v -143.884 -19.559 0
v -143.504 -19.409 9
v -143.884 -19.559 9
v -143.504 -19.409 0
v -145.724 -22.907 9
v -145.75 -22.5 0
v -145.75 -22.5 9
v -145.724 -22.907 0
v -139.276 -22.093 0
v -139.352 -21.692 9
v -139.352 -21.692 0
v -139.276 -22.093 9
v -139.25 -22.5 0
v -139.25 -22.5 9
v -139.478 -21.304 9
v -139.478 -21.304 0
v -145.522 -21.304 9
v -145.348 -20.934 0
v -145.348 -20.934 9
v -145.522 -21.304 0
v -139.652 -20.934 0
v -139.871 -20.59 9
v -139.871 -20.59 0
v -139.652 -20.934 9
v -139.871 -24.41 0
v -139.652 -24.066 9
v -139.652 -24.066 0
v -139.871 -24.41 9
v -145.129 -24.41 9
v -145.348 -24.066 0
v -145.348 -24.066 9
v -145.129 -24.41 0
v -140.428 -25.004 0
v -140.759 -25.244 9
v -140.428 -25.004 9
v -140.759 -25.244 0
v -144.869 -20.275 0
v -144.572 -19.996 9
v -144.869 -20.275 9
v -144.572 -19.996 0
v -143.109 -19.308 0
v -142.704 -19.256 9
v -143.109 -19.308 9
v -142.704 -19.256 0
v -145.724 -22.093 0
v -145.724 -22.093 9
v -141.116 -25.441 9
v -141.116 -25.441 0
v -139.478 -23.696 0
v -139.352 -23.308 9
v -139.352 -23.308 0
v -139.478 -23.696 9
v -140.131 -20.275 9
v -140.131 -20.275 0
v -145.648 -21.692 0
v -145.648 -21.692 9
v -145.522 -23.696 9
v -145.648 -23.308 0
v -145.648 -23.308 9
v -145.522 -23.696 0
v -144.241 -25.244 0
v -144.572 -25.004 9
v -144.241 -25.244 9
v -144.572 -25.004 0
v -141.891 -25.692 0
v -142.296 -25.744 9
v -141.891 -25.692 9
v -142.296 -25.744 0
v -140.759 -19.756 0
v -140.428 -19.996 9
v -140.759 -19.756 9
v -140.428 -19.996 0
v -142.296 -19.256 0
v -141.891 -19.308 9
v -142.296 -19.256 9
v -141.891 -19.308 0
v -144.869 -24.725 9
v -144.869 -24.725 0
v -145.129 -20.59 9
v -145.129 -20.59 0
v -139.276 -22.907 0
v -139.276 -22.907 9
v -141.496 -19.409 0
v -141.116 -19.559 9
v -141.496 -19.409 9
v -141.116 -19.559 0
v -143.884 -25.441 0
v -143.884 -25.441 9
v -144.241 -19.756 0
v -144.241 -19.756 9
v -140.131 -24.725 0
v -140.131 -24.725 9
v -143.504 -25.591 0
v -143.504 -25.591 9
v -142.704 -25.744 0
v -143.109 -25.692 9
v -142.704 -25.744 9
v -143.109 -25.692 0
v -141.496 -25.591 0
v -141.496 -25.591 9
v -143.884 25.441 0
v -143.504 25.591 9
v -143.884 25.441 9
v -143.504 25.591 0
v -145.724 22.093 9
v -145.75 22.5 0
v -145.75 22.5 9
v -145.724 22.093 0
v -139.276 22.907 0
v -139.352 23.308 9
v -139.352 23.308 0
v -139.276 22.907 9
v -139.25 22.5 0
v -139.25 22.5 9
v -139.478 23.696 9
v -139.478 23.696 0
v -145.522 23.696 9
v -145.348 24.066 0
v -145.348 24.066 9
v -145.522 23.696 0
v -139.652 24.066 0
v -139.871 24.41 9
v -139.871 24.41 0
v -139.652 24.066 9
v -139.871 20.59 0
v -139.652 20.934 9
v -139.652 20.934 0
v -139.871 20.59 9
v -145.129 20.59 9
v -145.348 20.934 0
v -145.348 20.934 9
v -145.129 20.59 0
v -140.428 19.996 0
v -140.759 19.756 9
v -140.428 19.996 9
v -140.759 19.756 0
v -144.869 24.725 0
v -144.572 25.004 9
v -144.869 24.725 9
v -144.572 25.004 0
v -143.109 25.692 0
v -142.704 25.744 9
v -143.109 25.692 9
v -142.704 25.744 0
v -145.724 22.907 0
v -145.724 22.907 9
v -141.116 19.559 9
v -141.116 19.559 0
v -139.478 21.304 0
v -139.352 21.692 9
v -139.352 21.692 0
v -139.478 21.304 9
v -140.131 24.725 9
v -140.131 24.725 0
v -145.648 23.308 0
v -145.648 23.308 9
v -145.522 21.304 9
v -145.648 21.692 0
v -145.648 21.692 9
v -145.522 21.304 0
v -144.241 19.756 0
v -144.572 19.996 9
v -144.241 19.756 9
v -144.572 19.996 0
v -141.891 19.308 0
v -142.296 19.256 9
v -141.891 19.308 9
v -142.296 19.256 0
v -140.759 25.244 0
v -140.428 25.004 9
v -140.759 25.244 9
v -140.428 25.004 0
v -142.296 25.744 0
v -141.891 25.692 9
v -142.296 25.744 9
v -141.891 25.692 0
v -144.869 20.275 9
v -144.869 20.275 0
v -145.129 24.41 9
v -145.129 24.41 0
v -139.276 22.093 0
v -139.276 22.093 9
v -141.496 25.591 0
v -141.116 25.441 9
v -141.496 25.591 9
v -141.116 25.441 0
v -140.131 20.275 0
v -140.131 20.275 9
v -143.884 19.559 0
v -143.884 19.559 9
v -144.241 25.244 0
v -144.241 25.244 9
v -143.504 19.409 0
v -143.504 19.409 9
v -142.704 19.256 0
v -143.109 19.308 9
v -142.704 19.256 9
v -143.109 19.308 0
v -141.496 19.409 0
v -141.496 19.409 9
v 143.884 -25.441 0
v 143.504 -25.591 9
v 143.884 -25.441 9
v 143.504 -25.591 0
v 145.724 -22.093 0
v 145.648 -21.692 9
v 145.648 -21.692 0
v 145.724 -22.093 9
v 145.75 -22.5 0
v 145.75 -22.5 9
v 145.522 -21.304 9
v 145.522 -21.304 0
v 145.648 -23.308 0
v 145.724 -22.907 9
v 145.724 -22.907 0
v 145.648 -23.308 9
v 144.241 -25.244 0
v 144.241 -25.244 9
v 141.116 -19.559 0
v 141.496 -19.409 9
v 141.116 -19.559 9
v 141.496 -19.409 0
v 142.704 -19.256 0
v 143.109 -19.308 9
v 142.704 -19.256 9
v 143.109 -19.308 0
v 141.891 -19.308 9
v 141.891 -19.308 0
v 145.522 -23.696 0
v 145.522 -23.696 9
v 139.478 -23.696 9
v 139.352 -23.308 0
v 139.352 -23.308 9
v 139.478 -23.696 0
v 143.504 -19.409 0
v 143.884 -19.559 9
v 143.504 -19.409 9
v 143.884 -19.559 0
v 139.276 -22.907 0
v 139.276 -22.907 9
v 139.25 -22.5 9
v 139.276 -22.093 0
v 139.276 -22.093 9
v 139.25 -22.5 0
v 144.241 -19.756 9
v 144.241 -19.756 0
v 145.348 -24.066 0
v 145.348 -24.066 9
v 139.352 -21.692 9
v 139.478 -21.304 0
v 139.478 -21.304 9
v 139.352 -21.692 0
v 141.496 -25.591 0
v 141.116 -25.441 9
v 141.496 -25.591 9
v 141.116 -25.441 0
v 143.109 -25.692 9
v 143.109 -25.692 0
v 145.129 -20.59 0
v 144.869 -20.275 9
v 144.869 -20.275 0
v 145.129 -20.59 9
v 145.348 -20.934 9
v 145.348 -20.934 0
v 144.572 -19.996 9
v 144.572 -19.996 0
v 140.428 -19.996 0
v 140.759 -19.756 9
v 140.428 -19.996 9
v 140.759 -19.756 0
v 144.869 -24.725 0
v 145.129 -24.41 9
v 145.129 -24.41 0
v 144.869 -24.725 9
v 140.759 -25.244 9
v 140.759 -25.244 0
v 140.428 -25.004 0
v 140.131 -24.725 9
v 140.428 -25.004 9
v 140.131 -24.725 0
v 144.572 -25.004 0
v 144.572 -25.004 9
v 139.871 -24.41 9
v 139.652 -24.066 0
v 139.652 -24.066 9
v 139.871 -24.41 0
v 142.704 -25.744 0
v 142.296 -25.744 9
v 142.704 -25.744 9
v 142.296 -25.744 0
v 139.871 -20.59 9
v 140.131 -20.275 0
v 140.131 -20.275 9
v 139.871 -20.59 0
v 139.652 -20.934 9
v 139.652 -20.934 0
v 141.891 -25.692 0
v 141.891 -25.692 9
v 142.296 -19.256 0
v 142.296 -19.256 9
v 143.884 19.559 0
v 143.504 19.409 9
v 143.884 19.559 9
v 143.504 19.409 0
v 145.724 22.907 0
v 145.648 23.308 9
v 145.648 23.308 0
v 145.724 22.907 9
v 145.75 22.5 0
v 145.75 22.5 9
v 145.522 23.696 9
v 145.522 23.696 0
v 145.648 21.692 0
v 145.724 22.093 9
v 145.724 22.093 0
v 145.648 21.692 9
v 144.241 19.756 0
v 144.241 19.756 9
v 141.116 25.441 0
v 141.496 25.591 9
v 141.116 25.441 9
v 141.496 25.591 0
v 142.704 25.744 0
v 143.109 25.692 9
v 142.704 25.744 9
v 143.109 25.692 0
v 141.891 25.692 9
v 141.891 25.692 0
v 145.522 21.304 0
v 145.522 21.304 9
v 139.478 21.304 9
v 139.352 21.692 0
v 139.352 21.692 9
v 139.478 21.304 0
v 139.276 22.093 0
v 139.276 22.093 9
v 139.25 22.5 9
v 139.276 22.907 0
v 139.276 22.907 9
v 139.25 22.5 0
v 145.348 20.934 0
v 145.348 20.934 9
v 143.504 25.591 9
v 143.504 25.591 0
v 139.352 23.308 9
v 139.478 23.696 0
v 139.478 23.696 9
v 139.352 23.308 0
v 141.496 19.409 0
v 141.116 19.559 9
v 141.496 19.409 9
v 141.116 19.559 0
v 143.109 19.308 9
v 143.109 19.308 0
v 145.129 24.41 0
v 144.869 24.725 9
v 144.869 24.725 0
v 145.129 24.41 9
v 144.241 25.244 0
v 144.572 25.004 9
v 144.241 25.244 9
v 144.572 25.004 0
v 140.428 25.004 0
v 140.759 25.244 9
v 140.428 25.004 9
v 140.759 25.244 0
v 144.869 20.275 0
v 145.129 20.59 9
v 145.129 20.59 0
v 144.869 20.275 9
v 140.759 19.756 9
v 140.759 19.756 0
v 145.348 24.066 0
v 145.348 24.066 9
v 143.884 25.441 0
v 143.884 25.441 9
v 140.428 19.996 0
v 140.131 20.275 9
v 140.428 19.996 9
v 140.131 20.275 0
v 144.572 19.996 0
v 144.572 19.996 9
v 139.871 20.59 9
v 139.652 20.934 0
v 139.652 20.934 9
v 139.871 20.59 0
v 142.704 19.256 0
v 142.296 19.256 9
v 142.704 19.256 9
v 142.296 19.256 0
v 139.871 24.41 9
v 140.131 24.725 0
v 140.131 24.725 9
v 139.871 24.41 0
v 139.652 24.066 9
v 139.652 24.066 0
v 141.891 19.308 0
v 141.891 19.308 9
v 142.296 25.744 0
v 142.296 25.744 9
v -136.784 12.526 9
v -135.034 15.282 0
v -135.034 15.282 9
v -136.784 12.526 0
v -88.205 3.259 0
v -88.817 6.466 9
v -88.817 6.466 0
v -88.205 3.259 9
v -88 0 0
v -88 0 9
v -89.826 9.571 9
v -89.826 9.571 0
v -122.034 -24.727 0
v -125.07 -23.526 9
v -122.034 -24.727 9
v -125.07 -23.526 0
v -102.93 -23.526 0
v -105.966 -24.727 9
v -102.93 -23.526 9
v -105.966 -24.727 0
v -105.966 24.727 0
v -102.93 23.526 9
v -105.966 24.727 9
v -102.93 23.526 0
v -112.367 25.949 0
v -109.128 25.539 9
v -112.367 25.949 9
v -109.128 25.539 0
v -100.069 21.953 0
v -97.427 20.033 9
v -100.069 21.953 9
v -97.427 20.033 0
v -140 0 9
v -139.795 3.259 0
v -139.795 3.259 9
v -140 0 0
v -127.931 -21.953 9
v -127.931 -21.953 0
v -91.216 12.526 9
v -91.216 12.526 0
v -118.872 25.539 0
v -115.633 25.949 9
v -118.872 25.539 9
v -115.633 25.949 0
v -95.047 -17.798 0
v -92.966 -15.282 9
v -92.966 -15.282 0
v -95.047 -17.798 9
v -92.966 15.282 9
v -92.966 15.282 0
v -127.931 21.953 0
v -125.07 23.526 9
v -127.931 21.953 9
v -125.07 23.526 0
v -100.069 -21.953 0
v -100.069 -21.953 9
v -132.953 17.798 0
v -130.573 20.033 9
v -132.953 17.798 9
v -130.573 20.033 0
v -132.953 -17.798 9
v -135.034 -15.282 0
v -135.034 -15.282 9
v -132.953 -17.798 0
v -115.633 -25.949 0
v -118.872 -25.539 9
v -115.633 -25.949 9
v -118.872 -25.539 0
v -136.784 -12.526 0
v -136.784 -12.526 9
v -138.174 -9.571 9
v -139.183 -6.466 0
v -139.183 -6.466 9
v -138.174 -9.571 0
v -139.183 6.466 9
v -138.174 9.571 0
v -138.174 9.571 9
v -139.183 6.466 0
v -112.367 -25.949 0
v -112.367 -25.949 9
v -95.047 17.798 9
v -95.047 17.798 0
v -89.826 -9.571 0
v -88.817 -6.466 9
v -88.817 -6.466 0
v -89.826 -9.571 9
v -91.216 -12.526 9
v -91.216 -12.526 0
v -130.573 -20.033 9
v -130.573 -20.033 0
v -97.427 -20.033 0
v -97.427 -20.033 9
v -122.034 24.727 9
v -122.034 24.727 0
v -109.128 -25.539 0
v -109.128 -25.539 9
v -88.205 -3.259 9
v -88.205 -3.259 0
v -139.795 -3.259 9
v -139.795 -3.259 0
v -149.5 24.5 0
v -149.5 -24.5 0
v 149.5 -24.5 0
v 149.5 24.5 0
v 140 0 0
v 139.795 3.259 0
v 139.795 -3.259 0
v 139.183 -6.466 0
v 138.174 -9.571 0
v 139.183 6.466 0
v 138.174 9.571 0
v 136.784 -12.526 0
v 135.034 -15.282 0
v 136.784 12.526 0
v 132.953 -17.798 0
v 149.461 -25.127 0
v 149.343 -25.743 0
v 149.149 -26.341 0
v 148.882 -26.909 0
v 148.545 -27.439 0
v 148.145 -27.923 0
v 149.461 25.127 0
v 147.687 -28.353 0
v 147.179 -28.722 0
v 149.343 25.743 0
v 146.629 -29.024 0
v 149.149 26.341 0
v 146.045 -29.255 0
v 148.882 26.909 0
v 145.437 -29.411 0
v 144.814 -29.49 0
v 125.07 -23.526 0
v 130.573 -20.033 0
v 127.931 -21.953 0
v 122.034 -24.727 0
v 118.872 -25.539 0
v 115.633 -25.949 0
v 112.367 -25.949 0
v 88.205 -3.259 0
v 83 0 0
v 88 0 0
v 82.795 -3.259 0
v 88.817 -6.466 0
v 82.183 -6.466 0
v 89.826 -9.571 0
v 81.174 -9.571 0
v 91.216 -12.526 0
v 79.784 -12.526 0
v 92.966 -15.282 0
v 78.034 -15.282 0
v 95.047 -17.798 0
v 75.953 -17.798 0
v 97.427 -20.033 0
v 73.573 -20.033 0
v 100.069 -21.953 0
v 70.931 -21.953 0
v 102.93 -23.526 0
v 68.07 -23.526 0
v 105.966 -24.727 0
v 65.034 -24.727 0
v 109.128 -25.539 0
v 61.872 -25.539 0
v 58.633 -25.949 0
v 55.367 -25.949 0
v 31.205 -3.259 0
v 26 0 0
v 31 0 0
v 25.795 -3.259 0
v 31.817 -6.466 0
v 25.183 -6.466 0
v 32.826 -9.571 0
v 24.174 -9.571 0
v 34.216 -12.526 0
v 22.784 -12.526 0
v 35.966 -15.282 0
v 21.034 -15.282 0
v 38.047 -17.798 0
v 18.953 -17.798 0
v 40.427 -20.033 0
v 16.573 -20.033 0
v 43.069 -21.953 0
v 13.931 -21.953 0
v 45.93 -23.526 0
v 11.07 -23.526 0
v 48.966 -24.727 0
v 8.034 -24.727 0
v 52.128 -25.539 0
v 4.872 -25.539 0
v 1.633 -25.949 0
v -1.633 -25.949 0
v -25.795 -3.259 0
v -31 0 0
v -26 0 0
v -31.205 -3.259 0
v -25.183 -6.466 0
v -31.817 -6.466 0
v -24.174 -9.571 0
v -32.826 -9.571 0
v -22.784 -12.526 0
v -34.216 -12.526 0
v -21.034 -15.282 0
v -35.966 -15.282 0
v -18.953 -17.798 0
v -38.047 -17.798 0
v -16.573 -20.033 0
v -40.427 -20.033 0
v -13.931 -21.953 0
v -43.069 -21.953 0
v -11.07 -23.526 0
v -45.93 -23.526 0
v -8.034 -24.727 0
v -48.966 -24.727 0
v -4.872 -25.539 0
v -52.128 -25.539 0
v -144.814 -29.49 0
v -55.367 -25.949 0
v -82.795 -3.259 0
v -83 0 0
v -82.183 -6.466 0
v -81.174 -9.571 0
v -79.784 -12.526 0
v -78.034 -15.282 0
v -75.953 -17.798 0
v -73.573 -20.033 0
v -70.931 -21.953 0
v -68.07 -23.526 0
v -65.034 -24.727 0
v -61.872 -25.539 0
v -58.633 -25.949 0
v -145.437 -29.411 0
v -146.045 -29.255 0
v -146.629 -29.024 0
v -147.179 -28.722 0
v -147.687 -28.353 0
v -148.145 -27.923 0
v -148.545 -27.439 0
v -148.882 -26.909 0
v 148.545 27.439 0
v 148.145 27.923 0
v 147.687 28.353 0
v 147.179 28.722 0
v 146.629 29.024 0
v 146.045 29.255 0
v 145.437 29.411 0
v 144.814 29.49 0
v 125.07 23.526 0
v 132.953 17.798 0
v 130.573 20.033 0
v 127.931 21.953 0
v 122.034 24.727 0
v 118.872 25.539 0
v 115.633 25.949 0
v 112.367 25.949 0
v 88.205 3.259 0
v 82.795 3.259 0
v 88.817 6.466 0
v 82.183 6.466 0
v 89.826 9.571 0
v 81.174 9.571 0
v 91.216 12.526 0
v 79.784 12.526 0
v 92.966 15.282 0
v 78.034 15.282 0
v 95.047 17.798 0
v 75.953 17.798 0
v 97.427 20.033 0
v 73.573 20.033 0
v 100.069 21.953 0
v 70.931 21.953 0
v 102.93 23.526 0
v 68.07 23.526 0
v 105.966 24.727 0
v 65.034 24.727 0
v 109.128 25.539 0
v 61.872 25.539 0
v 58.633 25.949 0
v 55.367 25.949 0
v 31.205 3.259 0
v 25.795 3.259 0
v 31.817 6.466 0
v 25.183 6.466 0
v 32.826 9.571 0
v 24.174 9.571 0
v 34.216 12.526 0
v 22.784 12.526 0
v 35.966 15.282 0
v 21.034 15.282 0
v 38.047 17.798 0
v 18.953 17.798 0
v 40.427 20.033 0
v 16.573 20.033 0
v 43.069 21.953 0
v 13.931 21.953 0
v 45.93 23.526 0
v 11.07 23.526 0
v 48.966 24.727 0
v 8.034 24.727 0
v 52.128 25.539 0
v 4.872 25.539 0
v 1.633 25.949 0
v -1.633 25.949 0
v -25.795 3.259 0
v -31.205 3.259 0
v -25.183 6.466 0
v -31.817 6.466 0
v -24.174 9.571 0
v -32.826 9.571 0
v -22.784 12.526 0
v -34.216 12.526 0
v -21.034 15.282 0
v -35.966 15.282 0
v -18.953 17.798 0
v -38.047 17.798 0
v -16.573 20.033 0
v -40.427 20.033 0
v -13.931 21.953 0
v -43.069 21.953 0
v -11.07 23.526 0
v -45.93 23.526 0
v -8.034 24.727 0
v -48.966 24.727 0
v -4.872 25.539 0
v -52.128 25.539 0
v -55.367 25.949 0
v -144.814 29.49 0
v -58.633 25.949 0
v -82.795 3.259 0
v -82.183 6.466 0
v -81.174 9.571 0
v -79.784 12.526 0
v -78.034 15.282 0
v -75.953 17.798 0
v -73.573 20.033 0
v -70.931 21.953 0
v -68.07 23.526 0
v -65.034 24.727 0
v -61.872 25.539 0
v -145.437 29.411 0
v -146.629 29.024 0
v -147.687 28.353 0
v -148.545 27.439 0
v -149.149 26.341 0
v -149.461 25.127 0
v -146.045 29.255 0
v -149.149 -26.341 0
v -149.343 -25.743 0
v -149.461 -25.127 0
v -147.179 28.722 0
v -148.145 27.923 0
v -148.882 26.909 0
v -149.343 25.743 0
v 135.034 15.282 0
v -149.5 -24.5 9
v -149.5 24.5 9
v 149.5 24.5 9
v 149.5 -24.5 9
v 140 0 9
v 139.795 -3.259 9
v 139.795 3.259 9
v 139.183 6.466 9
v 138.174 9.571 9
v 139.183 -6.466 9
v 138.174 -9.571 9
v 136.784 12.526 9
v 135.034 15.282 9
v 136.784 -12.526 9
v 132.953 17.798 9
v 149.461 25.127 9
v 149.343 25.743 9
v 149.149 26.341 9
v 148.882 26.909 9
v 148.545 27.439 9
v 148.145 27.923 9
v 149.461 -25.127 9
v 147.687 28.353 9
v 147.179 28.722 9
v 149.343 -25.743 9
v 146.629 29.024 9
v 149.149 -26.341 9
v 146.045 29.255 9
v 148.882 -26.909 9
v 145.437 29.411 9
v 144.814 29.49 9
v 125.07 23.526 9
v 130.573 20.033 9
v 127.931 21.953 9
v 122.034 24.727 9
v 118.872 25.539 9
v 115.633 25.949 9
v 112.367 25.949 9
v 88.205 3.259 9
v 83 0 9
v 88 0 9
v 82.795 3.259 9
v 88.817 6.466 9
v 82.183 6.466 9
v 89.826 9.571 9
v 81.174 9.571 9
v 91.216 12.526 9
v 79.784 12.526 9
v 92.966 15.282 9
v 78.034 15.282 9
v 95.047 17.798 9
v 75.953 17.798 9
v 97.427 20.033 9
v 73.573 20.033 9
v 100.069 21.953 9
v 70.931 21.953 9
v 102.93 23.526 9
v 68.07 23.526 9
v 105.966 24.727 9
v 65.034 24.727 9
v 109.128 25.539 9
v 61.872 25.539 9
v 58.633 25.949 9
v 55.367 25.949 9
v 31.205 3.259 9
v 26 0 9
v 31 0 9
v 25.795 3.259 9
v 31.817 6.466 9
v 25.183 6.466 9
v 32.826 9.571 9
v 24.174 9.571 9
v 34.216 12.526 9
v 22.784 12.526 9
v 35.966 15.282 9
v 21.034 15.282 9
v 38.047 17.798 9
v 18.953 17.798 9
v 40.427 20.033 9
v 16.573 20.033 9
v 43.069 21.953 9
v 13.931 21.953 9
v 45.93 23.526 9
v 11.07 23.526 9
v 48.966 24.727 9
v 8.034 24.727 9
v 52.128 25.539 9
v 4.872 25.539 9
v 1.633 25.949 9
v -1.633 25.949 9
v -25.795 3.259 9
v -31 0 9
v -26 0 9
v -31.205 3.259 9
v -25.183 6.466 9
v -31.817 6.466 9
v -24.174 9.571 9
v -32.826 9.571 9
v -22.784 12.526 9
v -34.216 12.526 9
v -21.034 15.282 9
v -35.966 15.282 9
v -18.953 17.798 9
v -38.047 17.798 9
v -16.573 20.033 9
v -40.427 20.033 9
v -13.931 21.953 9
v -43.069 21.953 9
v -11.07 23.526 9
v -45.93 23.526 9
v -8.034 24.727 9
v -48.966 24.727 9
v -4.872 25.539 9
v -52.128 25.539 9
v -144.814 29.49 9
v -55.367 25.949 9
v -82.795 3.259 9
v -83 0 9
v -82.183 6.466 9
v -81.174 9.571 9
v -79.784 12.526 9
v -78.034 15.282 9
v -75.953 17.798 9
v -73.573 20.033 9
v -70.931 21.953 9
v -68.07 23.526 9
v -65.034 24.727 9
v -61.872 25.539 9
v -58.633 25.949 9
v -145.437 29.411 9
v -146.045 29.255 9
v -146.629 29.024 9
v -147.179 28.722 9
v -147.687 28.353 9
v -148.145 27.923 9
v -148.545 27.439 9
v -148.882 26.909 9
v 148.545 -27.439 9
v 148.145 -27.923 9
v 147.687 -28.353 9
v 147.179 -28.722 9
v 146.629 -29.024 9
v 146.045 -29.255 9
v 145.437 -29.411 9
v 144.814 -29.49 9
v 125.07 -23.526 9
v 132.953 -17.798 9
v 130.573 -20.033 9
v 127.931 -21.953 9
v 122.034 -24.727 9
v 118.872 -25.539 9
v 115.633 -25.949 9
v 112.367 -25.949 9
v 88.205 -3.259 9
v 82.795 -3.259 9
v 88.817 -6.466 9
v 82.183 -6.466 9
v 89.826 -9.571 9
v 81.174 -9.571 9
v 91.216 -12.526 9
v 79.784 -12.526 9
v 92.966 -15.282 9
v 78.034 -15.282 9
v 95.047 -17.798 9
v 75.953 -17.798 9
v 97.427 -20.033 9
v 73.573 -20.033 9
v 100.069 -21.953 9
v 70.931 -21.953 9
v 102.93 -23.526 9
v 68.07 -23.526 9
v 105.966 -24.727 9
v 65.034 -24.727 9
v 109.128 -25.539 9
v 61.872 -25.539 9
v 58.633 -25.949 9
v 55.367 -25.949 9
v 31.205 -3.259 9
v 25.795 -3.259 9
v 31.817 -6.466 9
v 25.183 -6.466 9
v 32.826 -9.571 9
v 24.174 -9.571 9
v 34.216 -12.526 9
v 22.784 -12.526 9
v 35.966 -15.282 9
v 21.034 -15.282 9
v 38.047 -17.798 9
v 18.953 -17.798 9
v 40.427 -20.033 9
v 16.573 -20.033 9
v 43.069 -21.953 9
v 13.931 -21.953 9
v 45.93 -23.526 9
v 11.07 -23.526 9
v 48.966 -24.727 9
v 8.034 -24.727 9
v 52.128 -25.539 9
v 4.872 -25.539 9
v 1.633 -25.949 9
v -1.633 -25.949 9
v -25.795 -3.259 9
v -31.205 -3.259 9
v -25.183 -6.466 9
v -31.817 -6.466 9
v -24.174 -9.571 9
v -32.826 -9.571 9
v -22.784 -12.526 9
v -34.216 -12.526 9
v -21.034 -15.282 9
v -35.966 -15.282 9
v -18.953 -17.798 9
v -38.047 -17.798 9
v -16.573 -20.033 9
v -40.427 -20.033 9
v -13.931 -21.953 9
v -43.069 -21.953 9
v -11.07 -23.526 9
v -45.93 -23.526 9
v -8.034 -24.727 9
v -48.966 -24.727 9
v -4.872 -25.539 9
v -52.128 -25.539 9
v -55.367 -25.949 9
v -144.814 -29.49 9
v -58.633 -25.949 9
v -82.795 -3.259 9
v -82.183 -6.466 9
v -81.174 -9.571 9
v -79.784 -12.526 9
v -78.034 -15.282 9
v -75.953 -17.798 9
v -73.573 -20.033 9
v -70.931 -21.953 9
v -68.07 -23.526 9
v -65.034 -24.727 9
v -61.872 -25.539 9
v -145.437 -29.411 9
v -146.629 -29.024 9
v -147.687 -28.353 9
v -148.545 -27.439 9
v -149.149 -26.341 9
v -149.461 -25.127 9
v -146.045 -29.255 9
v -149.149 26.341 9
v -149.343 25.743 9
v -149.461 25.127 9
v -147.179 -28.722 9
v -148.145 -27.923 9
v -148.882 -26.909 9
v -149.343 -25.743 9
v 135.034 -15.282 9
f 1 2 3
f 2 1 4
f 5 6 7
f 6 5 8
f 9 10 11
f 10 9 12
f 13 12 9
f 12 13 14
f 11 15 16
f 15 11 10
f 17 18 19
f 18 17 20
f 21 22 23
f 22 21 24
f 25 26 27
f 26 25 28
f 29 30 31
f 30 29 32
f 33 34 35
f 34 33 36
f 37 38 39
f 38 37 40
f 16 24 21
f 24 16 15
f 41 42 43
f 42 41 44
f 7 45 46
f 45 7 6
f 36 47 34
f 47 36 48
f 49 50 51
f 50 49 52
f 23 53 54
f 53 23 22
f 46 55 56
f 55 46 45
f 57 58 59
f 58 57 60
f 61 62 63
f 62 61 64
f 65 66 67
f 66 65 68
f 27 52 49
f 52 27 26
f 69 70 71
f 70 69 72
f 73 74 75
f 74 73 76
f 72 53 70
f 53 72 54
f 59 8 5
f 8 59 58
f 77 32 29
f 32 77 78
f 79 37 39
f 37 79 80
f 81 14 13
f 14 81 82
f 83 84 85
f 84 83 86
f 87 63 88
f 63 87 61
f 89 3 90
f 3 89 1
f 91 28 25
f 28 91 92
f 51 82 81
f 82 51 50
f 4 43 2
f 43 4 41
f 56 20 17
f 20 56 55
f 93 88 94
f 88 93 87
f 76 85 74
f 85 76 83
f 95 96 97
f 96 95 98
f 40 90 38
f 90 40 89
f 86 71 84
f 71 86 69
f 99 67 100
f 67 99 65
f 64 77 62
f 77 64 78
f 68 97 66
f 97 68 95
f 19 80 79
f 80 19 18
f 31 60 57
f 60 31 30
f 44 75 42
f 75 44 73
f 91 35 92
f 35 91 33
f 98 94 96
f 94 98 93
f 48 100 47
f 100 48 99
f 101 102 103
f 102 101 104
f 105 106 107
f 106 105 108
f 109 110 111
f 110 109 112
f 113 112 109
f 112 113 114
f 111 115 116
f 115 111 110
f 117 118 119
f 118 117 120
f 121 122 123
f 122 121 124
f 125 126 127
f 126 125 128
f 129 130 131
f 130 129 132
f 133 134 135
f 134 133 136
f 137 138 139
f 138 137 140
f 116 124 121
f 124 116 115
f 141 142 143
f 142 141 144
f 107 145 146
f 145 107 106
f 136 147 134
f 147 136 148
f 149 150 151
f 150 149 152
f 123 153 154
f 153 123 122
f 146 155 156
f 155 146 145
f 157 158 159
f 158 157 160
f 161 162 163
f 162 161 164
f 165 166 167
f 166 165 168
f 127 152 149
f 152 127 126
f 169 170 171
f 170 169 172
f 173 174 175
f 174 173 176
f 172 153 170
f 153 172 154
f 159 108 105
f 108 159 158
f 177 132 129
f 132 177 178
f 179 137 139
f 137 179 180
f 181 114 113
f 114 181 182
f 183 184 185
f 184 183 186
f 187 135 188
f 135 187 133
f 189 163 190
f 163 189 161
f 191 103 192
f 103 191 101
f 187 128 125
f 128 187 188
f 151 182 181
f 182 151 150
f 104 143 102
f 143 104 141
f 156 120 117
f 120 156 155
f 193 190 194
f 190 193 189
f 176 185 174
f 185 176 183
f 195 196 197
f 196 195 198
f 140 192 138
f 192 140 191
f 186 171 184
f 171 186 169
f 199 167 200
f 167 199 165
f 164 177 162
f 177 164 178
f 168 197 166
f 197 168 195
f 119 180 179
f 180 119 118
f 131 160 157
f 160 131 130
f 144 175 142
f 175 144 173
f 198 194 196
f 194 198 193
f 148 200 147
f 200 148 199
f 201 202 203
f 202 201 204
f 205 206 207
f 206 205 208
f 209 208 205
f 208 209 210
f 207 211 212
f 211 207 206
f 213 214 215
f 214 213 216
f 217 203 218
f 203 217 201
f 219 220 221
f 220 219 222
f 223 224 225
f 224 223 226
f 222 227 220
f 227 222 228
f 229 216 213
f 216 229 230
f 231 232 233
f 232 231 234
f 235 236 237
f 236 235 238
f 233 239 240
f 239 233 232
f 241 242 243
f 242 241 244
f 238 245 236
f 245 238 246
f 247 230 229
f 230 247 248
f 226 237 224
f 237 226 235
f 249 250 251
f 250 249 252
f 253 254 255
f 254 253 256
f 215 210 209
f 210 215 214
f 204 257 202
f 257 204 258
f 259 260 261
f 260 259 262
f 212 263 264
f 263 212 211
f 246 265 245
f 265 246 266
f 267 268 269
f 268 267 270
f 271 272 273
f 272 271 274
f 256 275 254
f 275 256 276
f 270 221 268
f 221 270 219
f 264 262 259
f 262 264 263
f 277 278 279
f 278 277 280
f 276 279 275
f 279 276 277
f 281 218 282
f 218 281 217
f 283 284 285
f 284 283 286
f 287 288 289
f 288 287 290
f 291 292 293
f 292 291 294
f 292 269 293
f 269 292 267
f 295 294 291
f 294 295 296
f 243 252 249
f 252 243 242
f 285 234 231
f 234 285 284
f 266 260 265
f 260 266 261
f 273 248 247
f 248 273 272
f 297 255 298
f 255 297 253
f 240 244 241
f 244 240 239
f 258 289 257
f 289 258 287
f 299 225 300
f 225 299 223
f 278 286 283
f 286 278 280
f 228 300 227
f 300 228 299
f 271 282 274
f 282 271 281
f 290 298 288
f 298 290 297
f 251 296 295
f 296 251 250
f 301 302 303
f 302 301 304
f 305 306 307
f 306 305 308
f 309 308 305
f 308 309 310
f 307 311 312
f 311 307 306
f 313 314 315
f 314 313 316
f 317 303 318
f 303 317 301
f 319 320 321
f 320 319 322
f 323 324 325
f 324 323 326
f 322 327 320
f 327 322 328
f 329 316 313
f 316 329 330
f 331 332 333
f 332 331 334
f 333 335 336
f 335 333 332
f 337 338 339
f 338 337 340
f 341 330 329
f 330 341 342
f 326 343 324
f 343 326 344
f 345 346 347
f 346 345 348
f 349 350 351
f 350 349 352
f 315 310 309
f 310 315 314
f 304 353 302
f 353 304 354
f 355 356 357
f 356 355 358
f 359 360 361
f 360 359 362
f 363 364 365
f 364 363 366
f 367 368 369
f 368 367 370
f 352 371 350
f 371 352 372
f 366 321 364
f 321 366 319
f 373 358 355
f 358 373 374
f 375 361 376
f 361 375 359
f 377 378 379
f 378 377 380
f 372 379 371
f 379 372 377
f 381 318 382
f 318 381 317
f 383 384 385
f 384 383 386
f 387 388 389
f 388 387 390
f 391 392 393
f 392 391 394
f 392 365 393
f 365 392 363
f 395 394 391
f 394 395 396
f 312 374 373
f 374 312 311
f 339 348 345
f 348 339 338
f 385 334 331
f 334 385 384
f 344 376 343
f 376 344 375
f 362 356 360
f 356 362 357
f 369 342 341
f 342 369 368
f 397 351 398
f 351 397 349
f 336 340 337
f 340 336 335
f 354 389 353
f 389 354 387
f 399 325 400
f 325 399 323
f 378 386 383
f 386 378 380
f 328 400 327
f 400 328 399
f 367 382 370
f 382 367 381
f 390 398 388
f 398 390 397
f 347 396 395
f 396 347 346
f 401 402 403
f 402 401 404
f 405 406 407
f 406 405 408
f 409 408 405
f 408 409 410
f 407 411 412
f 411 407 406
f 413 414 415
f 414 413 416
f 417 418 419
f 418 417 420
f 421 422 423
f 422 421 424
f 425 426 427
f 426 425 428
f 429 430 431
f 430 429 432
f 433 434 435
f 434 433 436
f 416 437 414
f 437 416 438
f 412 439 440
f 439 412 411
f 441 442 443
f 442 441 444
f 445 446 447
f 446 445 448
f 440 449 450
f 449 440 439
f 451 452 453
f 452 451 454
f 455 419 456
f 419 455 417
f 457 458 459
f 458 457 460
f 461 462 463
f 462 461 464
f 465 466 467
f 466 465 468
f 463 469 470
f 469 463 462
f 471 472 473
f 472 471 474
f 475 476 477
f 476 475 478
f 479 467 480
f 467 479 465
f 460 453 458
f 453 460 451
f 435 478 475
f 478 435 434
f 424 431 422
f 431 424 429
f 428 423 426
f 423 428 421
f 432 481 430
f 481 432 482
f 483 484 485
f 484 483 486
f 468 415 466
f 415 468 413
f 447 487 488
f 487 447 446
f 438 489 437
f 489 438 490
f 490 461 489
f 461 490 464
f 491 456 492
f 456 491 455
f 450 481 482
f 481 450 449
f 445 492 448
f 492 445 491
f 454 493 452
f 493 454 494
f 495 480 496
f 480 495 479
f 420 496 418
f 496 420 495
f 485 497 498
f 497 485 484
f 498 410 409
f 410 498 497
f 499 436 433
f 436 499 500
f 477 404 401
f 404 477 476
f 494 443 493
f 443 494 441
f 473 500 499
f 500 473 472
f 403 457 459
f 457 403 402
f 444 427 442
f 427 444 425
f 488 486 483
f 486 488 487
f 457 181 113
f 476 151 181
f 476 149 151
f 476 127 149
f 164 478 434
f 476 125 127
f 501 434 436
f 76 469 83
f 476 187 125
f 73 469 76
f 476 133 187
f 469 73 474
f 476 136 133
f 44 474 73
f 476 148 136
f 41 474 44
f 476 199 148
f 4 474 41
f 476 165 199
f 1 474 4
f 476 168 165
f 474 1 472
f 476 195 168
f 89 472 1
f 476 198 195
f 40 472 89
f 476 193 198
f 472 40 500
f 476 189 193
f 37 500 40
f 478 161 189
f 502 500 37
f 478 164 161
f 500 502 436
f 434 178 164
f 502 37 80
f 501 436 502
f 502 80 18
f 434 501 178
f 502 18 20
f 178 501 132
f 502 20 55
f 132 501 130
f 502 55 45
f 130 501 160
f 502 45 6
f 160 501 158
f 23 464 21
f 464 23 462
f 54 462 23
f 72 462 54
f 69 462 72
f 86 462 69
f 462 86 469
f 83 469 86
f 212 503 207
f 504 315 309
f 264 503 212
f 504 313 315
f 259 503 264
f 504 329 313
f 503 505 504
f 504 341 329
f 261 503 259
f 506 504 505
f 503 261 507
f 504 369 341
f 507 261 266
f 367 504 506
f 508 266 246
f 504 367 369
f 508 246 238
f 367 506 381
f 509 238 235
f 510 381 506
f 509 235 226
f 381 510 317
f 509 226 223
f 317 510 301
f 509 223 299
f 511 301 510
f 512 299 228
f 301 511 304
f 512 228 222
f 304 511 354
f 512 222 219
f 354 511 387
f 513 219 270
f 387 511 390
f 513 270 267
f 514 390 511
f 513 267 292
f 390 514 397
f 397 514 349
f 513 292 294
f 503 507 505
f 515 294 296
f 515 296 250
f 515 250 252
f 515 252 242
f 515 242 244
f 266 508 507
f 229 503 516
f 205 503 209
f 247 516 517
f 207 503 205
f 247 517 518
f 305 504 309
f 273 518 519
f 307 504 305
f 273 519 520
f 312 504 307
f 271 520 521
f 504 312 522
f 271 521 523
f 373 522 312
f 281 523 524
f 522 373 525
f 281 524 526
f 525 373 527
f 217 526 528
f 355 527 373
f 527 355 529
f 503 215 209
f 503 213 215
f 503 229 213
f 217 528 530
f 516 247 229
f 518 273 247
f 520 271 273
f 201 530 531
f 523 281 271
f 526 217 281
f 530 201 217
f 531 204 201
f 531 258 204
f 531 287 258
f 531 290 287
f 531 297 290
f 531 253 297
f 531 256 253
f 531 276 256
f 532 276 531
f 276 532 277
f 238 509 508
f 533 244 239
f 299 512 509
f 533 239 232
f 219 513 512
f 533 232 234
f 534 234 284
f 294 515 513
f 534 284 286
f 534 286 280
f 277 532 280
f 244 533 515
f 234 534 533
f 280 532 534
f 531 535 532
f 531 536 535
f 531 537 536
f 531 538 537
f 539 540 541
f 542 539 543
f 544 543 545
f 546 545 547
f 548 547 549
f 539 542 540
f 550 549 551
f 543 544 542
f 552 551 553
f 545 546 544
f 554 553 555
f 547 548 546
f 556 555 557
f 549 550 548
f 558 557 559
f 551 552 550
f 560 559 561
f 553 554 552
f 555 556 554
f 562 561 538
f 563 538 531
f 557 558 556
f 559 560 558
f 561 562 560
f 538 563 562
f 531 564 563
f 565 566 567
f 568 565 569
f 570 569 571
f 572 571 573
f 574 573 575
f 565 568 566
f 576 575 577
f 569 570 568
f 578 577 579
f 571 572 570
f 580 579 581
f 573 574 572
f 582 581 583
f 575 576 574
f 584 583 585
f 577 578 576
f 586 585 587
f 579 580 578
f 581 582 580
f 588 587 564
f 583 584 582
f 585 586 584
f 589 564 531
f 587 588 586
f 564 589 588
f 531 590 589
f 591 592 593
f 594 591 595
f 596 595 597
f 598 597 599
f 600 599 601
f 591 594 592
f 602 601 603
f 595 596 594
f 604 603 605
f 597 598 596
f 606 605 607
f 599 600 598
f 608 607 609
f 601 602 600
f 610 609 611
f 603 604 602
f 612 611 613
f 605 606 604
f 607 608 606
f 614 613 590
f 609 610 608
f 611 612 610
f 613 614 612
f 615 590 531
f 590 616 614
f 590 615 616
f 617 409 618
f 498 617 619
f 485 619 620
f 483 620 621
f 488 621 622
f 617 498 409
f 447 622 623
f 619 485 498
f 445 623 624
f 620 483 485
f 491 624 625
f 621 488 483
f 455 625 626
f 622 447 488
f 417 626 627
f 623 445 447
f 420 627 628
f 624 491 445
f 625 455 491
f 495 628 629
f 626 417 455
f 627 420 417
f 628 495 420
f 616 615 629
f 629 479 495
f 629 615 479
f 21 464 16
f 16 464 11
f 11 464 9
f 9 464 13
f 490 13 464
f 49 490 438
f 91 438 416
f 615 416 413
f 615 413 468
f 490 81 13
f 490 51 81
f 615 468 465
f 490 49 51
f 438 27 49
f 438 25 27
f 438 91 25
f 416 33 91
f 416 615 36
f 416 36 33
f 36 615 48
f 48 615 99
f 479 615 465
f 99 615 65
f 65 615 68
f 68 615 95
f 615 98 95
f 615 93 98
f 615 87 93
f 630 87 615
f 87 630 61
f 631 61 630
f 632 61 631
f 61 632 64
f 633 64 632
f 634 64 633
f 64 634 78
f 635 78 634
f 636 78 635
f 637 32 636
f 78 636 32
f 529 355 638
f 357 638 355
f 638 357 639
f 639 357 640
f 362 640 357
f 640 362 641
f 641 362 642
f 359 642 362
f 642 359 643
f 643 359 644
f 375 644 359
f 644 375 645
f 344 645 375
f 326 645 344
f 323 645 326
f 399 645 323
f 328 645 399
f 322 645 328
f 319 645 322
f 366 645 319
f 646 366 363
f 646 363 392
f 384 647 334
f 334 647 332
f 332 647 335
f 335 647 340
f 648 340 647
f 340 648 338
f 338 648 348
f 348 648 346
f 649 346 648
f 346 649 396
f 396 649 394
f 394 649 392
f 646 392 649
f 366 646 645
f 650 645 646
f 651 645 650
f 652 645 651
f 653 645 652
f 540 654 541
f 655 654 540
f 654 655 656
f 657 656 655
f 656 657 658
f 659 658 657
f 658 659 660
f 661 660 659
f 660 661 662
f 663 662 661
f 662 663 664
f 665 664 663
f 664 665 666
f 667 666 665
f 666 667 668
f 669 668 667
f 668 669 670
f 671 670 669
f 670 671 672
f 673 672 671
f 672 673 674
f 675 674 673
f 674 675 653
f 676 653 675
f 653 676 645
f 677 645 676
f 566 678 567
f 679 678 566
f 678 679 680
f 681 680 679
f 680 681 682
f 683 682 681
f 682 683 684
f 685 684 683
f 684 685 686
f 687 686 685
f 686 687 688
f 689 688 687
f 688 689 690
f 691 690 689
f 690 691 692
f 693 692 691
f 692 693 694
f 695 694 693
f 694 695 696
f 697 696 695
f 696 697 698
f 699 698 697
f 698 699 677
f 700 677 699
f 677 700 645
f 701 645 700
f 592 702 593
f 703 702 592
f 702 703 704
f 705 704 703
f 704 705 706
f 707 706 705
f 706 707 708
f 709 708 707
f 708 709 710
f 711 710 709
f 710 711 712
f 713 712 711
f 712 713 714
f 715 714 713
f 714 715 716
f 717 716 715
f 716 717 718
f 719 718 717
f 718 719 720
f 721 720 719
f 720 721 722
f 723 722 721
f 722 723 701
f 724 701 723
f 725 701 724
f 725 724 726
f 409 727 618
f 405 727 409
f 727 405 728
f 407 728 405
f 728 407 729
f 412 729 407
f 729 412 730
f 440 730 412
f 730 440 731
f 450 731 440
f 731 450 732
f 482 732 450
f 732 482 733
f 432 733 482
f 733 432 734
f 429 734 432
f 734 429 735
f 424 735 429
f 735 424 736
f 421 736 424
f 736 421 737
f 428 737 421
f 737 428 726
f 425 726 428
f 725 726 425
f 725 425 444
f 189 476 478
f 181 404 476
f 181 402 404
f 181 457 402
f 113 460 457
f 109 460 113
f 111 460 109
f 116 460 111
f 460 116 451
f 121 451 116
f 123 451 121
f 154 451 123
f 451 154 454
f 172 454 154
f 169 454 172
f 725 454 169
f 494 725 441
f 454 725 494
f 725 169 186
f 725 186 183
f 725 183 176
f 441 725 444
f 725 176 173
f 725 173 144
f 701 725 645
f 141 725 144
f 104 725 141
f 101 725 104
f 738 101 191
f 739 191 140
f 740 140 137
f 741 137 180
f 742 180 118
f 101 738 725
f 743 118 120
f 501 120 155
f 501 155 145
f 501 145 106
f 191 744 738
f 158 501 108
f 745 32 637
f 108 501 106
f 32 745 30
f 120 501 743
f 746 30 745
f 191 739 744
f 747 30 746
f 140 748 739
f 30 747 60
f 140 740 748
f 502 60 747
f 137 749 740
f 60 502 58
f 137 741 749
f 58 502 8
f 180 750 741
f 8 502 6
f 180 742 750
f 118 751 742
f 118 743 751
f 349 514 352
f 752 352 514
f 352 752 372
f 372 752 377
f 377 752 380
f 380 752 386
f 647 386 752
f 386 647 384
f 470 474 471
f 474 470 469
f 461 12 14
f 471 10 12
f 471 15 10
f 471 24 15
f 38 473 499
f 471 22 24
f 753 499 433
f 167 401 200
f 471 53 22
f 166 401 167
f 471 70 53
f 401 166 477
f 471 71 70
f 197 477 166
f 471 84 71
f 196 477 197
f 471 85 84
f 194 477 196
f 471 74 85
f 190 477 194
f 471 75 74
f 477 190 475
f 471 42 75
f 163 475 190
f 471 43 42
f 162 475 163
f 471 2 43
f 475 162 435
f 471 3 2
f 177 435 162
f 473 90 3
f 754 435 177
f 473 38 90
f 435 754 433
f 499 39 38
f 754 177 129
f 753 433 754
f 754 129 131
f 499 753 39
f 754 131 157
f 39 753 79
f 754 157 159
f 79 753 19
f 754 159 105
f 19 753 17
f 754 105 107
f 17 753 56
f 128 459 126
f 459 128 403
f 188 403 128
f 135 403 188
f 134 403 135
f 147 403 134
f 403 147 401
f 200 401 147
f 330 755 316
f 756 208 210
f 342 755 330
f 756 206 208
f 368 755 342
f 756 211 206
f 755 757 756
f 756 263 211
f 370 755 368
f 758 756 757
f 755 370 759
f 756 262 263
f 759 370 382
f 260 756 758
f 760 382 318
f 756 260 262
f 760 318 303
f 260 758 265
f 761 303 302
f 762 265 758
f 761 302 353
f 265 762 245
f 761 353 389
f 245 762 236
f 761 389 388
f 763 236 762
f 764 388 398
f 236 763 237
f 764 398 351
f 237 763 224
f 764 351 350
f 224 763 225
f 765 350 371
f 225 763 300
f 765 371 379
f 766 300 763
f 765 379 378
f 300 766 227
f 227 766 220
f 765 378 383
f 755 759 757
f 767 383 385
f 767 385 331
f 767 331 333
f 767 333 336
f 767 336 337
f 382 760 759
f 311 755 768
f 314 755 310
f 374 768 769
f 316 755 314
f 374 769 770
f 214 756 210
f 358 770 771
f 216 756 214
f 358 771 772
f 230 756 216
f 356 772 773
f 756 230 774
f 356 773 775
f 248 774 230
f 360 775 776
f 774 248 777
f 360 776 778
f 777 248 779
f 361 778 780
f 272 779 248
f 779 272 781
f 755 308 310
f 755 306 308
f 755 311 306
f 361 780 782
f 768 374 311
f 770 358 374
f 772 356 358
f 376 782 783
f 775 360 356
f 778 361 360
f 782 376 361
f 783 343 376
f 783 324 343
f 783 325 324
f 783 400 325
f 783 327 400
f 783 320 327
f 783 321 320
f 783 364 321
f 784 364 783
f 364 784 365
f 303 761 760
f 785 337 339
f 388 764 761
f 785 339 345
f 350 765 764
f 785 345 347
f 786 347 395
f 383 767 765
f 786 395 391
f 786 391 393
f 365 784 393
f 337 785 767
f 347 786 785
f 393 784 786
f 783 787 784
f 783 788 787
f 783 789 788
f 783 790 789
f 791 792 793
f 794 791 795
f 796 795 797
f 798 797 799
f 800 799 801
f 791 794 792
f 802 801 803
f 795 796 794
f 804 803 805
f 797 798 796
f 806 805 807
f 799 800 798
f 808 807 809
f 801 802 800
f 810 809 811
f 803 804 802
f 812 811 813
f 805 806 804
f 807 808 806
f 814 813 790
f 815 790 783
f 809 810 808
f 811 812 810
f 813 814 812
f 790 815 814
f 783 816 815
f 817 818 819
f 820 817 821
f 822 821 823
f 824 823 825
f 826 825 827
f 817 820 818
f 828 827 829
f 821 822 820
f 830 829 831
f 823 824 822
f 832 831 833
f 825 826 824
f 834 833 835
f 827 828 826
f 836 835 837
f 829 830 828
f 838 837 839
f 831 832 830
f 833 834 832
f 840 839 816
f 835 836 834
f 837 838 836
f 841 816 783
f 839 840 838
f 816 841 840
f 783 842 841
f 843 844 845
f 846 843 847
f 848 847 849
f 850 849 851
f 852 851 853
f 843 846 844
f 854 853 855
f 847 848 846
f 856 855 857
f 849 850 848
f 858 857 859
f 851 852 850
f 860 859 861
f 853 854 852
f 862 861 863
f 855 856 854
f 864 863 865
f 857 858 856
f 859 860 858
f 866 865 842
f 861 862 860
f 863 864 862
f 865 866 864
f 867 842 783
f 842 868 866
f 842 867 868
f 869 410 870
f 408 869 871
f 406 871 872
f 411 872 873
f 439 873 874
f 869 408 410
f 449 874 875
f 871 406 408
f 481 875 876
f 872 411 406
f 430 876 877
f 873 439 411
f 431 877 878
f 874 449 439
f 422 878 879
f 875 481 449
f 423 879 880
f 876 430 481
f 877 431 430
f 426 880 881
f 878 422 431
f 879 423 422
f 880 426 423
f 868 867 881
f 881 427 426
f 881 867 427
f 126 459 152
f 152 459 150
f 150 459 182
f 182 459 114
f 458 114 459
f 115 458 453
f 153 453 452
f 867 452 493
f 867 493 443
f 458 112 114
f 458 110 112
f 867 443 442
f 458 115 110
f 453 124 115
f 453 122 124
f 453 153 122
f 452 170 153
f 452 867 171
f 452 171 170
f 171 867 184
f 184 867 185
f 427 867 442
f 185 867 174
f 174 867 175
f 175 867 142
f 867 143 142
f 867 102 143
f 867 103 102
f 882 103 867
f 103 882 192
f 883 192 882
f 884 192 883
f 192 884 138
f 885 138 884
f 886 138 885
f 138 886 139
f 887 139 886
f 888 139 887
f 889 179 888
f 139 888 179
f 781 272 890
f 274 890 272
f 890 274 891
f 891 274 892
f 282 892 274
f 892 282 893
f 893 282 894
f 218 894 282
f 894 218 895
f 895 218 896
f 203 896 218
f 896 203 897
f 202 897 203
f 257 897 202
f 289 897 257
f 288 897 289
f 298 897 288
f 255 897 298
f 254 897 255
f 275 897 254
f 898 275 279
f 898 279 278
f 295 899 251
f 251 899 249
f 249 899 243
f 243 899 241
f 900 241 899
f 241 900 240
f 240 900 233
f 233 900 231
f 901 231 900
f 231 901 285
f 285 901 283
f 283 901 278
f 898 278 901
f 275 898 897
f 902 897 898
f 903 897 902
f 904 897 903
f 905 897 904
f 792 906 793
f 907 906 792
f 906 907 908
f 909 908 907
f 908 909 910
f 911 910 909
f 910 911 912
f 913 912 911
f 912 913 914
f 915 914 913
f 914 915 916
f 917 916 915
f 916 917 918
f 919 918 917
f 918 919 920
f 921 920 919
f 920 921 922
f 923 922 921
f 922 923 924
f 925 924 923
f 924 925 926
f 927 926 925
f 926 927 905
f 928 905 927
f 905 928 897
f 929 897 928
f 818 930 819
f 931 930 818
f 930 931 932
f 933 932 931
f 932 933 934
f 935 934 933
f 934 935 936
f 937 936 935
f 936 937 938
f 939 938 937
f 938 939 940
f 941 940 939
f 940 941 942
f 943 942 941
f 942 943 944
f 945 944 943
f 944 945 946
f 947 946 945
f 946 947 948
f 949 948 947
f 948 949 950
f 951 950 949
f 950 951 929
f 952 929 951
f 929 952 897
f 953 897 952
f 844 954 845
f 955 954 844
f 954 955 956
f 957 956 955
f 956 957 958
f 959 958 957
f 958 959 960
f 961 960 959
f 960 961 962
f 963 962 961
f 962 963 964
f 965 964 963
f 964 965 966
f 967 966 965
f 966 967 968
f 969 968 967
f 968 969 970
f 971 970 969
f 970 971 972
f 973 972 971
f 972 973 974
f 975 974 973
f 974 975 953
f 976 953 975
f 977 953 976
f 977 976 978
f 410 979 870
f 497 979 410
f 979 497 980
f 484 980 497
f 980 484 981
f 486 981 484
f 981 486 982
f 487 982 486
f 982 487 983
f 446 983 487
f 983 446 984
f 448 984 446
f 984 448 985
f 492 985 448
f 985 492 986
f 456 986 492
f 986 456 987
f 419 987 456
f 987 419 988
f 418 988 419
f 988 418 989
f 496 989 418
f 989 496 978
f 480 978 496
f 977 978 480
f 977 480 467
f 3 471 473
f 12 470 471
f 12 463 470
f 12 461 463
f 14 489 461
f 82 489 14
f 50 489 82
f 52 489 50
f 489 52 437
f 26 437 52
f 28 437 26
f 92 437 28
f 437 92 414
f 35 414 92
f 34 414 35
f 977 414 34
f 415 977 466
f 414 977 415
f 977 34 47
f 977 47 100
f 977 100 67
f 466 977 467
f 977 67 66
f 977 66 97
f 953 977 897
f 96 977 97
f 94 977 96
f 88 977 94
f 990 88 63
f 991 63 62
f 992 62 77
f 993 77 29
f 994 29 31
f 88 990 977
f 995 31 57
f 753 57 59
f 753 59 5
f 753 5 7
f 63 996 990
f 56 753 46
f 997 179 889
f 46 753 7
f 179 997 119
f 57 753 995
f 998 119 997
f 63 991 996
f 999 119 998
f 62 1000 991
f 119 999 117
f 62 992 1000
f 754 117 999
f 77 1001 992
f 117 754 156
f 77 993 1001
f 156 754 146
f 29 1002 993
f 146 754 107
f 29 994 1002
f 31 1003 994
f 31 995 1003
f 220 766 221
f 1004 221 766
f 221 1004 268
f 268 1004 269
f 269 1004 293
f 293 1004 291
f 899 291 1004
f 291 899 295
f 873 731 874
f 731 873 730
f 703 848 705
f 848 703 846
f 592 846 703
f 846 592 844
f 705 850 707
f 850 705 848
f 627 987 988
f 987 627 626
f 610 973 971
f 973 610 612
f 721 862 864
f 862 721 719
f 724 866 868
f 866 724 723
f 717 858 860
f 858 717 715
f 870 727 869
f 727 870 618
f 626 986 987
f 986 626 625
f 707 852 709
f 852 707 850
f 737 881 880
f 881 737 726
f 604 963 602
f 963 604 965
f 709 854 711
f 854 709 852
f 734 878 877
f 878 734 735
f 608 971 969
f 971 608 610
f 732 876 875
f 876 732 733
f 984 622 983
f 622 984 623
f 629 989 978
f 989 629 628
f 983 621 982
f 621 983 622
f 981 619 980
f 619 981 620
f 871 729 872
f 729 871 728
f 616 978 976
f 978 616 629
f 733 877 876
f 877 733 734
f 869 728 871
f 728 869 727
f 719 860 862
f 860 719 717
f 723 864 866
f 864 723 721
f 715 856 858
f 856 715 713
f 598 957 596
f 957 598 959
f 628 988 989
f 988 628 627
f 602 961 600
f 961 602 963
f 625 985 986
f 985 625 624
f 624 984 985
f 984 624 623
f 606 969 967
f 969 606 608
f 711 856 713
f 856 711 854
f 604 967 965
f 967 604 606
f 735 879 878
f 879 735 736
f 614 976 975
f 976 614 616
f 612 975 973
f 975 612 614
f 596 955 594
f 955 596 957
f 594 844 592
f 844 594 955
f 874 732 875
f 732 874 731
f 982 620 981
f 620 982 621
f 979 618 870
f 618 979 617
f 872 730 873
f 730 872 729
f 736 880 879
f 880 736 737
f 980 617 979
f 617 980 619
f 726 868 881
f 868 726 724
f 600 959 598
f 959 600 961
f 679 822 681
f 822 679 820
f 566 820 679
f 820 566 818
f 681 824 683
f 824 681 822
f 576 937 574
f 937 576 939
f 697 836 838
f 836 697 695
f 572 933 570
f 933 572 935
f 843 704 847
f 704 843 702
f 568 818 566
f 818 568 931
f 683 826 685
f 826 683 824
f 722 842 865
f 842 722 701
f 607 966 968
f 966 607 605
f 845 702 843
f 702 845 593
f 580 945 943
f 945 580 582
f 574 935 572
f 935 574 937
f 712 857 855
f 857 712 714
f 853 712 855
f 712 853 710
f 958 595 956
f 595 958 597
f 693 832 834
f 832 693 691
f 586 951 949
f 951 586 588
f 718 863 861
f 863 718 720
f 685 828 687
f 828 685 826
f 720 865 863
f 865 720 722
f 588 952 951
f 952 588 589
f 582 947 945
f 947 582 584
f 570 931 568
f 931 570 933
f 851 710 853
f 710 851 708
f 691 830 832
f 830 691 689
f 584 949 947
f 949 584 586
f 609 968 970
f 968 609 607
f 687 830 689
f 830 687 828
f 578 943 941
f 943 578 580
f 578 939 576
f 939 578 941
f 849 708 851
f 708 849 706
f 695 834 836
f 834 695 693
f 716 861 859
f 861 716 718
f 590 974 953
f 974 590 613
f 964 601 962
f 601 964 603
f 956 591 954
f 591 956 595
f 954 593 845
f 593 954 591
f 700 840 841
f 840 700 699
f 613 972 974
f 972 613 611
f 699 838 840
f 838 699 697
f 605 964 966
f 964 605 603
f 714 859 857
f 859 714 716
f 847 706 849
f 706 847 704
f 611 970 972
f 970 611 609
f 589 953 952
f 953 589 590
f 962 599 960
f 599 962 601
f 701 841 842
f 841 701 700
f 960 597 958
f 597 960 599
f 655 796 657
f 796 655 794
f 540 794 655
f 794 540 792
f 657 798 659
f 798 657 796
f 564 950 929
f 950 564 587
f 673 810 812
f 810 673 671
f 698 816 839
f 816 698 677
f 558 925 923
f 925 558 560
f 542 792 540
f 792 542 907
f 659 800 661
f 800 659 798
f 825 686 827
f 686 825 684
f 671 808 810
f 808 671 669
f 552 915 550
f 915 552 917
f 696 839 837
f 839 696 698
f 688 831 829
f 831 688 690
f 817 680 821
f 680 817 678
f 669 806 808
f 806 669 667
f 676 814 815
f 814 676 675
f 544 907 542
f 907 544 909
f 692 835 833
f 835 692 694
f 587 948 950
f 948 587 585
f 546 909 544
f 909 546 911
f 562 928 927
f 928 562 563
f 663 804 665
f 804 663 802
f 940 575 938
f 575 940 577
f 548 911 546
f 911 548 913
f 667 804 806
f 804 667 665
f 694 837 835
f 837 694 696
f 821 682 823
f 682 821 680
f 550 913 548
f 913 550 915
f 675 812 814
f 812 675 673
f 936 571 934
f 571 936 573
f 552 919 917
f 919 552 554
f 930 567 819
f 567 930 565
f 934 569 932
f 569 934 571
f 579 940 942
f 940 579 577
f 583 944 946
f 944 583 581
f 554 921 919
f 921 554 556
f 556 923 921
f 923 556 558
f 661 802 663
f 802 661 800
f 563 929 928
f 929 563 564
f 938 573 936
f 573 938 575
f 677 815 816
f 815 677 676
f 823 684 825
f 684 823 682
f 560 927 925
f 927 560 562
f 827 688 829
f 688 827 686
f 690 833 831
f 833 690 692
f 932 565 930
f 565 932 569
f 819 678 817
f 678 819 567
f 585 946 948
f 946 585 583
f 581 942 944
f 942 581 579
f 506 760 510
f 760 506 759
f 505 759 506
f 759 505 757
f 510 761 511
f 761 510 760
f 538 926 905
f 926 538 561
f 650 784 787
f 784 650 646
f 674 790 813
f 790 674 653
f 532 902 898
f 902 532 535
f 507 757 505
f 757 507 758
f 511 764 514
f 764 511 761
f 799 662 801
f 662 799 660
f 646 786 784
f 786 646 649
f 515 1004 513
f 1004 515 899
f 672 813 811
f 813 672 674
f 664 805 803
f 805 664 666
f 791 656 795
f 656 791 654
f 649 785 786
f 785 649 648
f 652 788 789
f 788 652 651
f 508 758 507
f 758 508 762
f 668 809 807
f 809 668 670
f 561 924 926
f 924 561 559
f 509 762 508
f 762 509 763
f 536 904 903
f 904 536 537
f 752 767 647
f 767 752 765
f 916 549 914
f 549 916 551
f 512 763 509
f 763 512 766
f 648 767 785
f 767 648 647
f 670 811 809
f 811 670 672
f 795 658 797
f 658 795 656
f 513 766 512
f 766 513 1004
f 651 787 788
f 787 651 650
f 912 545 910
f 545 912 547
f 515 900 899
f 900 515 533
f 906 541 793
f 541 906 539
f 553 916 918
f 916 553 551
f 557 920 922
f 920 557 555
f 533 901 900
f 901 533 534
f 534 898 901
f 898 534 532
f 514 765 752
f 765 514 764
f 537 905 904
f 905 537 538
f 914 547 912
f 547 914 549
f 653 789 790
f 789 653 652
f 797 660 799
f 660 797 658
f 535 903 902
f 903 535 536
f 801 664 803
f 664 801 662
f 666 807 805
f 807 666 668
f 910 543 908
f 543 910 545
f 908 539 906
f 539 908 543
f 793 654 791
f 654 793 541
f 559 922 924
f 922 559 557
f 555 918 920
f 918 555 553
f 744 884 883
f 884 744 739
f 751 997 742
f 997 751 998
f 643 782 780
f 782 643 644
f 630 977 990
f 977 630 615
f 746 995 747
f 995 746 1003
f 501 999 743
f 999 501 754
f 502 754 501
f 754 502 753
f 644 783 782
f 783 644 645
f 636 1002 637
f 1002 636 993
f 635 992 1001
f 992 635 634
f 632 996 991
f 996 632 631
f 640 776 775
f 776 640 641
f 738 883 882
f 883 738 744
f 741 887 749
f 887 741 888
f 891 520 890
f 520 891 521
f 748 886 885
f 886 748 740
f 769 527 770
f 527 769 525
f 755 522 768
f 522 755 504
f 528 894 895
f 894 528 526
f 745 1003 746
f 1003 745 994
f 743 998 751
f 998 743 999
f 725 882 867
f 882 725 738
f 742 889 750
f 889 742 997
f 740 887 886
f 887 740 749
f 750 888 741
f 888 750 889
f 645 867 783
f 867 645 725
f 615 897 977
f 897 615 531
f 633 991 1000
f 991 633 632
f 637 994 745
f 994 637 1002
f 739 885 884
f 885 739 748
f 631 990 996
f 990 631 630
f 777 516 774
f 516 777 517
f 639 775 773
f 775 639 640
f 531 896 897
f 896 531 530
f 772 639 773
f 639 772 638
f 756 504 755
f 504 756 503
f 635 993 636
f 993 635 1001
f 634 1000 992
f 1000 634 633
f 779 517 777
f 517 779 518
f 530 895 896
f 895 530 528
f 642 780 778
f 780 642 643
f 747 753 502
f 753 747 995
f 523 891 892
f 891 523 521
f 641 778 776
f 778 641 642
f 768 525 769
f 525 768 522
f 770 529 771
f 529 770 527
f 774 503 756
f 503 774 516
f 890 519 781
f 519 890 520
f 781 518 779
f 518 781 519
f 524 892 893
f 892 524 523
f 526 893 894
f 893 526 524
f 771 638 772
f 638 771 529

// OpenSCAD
$fn = 50;


difference() {
	union() {
		hull() {
			translate(v = [-144.5000000000, 24.5000000000, 0]) {
				cylinder(h = 9, r = 5);
			}
			translate(v = [144.5000000000, 24.5000000000, 0]) {
				cylinder(h = 9, r = 5);
			}
			translate(v = [-144.5000000000, -24.5000000000, 0]) {
				cylinder(h = 9, r = 5);
			}
			translate(v = [144.5000000000, -24.5000000000, 0]) {
				cylinder(h = 9, r = 5);
			}
		}
	}
	union() {
		#translate(v = [-142.5000000000, -22.5000000000, -100.0000000000]) {
			cylinder(h = 200, r = 3.2500000000);
		}
		#translate(v = [-142.5000000000, 22.5000000000, -100.0000000000]) {
			cylinder(h = 200, r = 3.2500000000);
		}
		#translate(v = [142.5000000000, -22.5000000000, -100.0000000000]) {
			cylinder(h = 200, r = 3.2500000000);
		}
		#translate(v = [142.5000000000, 22.5000000000, -100.0000000000]) {
			cylinder(h = 200, r = 3.2500000000);
		}
		#translate(v = [-114.0000000000, 0, 0]) {
			cylinder(h = 9, r = 26.0000000000);
		}
		#translate(v = [-57.0000000000, 0, 0]) {
			cylinder(h = 9, r = 26.0000000000);
		}
		#cylinder(h = 9, r = 26.0000000000);
		#translate(v = [57.0000000000, 0, 0]) {
			cylinder(h = 9, r = 26.0000000000);
		}
		#translate(v = [114.0000000000, 0, 0]) {
			cylinder(h = 9, r = 26.0000000000);
		}
	}
}
